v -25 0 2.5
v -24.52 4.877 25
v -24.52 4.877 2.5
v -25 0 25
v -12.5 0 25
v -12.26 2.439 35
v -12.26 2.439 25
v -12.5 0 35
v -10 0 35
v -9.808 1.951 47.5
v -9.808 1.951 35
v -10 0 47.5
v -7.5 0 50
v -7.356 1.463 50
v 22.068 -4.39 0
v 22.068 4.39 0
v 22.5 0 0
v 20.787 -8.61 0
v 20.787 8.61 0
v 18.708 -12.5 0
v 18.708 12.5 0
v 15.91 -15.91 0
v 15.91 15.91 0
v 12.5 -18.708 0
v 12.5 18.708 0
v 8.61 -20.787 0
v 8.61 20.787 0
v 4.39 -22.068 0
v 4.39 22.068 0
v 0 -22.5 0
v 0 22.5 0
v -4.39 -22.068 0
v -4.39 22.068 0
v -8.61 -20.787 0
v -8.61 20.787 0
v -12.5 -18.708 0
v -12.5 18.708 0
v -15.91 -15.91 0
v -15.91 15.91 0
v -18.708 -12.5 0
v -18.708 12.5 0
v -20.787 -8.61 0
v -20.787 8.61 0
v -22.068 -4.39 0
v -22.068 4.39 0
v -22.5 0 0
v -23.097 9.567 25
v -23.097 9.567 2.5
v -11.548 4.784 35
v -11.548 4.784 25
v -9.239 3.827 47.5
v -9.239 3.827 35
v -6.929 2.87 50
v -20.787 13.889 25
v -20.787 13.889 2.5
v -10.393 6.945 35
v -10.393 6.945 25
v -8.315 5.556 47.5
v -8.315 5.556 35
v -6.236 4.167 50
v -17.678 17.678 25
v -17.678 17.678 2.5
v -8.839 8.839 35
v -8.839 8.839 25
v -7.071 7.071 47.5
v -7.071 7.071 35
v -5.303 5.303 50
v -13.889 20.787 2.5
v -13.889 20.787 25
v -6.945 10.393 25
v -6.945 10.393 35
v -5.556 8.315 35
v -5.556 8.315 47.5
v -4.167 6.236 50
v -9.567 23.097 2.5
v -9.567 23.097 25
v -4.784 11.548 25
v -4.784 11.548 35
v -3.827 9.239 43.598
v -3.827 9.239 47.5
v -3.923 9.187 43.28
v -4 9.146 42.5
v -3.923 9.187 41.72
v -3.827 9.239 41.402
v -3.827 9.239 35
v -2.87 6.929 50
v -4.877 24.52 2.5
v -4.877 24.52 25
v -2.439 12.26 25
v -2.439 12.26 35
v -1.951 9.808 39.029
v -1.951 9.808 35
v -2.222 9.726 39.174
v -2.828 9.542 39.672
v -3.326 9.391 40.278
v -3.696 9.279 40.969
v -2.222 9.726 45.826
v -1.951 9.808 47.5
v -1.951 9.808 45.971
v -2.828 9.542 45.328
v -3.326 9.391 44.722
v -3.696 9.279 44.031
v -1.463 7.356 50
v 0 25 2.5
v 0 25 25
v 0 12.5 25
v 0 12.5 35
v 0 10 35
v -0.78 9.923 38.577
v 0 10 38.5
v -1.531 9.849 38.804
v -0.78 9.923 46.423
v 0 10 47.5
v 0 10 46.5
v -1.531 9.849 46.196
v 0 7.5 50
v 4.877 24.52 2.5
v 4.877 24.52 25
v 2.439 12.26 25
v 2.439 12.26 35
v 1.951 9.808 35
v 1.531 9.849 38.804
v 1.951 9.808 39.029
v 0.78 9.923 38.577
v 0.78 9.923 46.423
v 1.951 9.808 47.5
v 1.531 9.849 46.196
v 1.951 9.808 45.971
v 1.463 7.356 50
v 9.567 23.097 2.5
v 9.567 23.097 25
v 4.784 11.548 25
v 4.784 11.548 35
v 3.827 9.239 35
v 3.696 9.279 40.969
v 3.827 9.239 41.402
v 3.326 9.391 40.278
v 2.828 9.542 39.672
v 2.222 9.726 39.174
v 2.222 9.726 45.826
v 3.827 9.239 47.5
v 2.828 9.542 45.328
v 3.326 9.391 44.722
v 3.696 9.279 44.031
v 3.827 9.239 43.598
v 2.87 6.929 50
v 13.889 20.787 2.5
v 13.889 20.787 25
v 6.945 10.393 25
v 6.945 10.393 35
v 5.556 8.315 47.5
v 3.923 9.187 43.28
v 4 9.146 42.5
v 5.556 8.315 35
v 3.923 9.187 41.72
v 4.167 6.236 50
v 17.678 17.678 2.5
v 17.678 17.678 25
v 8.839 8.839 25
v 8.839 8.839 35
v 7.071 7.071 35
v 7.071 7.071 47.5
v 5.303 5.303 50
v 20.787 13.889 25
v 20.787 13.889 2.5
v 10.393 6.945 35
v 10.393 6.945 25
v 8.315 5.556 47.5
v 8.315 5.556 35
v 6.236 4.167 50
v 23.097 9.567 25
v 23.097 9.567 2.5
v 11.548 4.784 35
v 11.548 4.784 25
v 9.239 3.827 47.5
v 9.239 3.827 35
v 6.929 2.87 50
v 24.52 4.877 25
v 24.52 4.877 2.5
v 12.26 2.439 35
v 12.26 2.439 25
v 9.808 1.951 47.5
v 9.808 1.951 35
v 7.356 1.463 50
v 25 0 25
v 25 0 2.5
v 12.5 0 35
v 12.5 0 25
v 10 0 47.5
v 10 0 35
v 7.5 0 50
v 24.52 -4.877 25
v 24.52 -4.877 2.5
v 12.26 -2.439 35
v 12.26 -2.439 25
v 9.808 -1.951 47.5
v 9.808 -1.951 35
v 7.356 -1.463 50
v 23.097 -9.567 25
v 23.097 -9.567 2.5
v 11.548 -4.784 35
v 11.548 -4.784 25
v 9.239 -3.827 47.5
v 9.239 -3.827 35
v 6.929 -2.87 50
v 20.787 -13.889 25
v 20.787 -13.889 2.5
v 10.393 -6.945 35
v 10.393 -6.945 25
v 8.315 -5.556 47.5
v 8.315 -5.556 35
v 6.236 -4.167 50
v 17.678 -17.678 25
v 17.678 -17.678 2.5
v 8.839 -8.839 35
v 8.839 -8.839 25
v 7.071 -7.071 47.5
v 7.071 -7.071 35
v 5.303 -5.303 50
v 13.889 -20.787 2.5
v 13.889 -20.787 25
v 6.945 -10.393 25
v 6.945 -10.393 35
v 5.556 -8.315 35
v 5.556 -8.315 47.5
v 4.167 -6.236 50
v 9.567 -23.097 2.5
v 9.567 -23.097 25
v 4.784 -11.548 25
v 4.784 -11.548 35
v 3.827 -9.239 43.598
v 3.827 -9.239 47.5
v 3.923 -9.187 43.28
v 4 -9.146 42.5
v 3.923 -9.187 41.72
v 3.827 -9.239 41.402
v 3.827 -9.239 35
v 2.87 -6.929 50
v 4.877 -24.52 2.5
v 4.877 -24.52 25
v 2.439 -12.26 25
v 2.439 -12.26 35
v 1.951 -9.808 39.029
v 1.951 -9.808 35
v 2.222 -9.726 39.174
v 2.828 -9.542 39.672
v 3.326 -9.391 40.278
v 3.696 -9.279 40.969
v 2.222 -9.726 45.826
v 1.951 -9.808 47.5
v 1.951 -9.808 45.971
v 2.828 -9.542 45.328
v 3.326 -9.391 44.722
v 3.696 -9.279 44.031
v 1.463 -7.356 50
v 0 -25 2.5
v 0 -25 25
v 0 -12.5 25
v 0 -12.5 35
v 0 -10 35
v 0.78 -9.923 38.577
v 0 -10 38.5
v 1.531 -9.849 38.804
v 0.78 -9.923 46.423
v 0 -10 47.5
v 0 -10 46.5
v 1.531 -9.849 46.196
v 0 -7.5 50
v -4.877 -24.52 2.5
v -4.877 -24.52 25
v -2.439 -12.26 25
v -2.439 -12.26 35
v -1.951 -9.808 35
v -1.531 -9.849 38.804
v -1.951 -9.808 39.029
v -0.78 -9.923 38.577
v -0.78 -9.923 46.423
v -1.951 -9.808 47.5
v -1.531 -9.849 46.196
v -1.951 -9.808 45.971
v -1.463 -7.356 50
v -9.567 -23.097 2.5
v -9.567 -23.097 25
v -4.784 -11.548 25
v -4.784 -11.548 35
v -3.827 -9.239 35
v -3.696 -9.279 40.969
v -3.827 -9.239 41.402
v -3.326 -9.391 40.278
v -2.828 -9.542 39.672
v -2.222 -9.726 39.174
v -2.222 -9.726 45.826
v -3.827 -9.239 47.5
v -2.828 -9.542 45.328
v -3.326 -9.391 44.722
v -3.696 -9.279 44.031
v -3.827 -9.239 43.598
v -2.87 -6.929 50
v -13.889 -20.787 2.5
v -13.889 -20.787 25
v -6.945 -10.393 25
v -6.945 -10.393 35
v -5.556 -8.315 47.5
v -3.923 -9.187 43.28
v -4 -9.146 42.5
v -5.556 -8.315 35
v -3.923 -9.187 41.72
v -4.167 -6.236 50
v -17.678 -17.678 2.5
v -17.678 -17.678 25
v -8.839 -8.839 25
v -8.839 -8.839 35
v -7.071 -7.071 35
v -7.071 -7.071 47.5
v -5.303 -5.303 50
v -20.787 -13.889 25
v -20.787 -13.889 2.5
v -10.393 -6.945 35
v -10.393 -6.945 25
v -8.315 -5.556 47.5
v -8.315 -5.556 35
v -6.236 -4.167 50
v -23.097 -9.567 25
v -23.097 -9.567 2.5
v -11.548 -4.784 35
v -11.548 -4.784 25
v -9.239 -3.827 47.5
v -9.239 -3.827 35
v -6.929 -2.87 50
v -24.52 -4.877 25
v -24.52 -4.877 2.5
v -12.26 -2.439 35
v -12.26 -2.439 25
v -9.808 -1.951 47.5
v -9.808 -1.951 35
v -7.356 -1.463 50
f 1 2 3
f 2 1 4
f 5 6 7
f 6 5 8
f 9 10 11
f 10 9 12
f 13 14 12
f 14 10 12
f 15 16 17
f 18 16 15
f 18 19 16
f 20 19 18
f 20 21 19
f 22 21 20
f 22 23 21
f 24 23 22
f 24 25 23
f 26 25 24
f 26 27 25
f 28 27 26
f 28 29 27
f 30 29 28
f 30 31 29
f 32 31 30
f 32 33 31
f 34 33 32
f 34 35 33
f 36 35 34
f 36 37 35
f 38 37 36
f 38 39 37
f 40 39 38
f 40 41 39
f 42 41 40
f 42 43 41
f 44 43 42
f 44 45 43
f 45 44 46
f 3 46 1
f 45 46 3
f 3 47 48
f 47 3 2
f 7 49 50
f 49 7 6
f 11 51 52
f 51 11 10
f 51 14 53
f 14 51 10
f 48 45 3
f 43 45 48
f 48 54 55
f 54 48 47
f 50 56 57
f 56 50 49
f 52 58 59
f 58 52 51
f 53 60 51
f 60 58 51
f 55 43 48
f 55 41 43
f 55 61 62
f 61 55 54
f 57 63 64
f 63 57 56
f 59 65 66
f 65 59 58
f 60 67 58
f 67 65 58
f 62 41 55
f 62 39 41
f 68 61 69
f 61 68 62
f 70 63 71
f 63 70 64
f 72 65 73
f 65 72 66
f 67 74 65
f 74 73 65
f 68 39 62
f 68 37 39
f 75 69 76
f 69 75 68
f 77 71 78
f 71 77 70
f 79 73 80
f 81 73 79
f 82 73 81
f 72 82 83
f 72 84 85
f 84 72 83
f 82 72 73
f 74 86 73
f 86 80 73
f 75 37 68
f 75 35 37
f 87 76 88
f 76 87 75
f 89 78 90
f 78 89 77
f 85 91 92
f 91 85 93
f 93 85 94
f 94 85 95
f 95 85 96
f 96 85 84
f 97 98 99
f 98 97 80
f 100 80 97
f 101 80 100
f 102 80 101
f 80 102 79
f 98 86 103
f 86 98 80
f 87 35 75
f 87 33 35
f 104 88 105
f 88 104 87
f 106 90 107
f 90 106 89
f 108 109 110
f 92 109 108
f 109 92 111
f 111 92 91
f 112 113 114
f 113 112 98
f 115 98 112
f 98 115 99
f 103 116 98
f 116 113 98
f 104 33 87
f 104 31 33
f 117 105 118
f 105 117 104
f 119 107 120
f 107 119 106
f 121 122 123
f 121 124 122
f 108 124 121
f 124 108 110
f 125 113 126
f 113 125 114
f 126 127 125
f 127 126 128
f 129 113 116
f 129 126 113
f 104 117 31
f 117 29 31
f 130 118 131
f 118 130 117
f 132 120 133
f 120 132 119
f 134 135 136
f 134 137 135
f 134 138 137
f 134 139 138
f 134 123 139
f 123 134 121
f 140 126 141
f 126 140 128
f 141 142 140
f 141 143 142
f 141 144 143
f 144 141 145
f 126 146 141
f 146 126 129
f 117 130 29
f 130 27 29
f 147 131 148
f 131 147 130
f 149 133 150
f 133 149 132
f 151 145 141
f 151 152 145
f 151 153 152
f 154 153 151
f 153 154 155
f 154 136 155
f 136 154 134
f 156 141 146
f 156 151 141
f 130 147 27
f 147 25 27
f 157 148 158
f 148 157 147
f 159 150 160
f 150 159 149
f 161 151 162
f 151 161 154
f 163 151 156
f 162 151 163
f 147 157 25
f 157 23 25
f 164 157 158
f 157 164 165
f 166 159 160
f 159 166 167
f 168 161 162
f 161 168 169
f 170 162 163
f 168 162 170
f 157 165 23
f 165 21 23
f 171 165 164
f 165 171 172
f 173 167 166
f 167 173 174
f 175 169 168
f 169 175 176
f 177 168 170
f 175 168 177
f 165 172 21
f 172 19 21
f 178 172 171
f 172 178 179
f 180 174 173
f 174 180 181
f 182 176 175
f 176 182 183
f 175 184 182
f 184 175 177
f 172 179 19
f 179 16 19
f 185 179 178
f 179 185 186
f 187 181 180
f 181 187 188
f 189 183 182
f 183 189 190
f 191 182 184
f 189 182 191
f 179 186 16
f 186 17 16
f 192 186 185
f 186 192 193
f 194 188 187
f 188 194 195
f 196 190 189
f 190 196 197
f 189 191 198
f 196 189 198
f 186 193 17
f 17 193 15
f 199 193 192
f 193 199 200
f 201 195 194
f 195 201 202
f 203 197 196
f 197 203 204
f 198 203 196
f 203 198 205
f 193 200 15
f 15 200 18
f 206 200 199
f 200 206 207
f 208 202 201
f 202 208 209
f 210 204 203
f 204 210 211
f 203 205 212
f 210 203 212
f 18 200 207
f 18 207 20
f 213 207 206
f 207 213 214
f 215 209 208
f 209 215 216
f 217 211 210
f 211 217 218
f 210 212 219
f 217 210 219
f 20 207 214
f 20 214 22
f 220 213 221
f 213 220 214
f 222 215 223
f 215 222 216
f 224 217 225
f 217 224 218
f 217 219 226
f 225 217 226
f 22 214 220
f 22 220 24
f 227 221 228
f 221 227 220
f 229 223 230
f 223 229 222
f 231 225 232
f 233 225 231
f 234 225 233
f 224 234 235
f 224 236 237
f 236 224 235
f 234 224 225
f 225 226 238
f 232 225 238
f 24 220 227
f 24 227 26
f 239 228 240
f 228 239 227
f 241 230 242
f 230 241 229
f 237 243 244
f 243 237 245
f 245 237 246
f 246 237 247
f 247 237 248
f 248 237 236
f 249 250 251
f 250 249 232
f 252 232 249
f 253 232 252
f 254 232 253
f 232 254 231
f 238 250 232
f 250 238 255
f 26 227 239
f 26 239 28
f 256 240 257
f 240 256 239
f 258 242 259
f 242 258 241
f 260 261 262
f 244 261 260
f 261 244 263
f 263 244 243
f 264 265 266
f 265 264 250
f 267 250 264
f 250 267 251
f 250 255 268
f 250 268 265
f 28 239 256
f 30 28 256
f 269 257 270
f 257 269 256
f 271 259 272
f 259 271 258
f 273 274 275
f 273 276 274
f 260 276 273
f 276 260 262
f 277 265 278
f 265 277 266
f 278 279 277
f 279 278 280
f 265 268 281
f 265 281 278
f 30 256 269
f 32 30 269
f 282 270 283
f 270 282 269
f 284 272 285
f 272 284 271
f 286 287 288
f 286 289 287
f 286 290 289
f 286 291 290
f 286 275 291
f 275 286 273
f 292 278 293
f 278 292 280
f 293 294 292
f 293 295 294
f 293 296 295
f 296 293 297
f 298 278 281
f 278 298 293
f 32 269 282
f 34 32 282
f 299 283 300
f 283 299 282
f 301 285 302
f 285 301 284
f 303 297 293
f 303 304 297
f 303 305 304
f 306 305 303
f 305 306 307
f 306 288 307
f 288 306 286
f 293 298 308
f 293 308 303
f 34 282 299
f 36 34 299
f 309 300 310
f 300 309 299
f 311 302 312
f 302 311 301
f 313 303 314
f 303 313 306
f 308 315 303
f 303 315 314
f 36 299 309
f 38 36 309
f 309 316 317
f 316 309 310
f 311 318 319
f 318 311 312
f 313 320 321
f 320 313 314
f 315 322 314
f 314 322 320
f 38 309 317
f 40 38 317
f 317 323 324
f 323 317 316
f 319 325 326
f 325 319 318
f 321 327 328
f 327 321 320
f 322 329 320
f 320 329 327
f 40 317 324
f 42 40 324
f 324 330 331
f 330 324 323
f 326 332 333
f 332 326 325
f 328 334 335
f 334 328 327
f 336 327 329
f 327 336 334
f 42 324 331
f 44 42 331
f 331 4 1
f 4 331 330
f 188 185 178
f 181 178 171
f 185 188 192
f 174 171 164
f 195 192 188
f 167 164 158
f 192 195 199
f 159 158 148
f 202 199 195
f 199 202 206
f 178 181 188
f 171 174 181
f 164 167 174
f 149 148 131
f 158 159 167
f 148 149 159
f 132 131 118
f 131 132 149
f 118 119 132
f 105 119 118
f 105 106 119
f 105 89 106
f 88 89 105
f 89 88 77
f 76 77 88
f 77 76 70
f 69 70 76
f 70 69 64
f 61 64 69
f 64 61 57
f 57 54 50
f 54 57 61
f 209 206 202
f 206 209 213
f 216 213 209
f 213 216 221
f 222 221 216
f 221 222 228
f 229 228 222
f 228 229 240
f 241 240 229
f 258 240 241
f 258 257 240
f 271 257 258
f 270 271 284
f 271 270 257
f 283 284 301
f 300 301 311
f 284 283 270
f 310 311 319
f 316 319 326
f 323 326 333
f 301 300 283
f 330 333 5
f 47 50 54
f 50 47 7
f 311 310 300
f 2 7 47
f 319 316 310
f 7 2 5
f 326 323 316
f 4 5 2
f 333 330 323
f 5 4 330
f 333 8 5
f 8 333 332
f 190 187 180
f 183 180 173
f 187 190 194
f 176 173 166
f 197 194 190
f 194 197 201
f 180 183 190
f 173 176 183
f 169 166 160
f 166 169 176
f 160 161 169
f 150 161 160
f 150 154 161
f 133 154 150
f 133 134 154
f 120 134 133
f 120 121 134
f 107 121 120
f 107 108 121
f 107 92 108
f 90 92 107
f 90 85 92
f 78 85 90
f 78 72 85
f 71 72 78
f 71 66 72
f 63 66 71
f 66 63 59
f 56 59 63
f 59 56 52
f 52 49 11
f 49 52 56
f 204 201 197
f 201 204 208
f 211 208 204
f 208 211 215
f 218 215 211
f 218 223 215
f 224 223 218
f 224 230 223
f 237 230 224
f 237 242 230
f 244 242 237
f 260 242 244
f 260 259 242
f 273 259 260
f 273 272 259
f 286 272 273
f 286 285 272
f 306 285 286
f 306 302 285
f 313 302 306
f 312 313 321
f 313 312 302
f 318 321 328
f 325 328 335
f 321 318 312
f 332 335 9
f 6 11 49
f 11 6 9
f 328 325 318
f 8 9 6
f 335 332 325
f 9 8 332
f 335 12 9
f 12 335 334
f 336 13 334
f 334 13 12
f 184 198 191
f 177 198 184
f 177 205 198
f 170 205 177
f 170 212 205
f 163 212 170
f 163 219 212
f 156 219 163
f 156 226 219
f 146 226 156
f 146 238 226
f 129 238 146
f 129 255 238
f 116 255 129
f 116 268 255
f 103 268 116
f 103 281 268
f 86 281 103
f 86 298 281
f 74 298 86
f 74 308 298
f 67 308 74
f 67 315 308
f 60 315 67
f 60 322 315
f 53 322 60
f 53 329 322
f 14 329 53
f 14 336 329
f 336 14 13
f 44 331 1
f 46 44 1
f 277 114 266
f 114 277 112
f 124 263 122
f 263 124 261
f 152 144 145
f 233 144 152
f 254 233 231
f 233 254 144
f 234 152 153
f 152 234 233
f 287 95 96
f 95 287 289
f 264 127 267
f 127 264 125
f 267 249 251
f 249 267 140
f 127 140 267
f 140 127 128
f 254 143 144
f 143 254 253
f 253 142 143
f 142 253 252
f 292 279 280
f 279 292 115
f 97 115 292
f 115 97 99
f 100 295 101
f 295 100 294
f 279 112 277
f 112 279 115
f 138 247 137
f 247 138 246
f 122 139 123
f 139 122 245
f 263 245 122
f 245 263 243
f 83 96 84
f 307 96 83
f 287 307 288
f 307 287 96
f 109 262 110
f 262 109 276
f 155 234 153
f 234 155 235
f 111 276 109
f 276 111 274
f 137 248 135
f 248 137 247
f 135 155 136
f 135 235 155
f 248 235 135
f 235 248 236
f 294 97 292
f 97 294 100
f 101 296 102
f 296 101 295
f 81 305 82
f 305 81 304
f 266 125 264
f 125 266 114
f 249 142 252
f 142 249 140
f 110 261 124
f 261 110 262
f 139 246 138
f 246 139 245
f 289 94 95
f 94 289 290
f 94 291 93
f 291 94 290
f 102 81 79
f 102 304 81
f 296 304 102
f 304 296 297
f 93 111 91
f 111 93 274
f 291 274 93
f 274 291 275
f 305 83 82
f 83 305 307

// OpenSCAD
$fn = 32;

// ----------------------------------------------------------------------
// Stepped shaft: diameters 50, 25, 20 mm, 50 mm long
// ----------------------------------------------------------------------

// --- parameters (mm) ---
d1 = 50;                  // step 1 diameter
len1 = 25;                // step 1 length
d2 = 25;                  // step 2 diameter
len2 = 10;                // step 2 length
d3 = 20;                  // step 3 diameter
len3 = 15;                // step 3 length
total = 50;               // overall length
chamfer = 2.5;            // end chamfer
key_w = 6;                // keyway width
key_d = 3;                // keyway depth
key_len = 19;             // keyway length
key_z = 28;               // keyway start along the shaft
cross_d = 8;              // cross pin hole
cross_z = 42.5;           // cross hole position

/* closed turning profile: x is the radius, y is the length */
profile = [[0, 0], [25 - chamfer, 0], [25, chamfer], [25, 25], [12.5, 25], [12.5, 35], [10, 35], [10, 47.5], [7.5, 50], [0, 50]];

difference() {
  rotate_extrude() polygon(profile);
  /* keyway milled into the top of the largest step */
  translate([d1 / 2 - key_d, -key_w / 2, key_z]) cube([key_d + 1, key_w, key_len]);
  /* cross pin hole through the small step */
  translate([0, 0, cross_z]) rotate([90, 0, 0]) cylinder(h = d3 + 4, d = cross_d, center = true);
}
